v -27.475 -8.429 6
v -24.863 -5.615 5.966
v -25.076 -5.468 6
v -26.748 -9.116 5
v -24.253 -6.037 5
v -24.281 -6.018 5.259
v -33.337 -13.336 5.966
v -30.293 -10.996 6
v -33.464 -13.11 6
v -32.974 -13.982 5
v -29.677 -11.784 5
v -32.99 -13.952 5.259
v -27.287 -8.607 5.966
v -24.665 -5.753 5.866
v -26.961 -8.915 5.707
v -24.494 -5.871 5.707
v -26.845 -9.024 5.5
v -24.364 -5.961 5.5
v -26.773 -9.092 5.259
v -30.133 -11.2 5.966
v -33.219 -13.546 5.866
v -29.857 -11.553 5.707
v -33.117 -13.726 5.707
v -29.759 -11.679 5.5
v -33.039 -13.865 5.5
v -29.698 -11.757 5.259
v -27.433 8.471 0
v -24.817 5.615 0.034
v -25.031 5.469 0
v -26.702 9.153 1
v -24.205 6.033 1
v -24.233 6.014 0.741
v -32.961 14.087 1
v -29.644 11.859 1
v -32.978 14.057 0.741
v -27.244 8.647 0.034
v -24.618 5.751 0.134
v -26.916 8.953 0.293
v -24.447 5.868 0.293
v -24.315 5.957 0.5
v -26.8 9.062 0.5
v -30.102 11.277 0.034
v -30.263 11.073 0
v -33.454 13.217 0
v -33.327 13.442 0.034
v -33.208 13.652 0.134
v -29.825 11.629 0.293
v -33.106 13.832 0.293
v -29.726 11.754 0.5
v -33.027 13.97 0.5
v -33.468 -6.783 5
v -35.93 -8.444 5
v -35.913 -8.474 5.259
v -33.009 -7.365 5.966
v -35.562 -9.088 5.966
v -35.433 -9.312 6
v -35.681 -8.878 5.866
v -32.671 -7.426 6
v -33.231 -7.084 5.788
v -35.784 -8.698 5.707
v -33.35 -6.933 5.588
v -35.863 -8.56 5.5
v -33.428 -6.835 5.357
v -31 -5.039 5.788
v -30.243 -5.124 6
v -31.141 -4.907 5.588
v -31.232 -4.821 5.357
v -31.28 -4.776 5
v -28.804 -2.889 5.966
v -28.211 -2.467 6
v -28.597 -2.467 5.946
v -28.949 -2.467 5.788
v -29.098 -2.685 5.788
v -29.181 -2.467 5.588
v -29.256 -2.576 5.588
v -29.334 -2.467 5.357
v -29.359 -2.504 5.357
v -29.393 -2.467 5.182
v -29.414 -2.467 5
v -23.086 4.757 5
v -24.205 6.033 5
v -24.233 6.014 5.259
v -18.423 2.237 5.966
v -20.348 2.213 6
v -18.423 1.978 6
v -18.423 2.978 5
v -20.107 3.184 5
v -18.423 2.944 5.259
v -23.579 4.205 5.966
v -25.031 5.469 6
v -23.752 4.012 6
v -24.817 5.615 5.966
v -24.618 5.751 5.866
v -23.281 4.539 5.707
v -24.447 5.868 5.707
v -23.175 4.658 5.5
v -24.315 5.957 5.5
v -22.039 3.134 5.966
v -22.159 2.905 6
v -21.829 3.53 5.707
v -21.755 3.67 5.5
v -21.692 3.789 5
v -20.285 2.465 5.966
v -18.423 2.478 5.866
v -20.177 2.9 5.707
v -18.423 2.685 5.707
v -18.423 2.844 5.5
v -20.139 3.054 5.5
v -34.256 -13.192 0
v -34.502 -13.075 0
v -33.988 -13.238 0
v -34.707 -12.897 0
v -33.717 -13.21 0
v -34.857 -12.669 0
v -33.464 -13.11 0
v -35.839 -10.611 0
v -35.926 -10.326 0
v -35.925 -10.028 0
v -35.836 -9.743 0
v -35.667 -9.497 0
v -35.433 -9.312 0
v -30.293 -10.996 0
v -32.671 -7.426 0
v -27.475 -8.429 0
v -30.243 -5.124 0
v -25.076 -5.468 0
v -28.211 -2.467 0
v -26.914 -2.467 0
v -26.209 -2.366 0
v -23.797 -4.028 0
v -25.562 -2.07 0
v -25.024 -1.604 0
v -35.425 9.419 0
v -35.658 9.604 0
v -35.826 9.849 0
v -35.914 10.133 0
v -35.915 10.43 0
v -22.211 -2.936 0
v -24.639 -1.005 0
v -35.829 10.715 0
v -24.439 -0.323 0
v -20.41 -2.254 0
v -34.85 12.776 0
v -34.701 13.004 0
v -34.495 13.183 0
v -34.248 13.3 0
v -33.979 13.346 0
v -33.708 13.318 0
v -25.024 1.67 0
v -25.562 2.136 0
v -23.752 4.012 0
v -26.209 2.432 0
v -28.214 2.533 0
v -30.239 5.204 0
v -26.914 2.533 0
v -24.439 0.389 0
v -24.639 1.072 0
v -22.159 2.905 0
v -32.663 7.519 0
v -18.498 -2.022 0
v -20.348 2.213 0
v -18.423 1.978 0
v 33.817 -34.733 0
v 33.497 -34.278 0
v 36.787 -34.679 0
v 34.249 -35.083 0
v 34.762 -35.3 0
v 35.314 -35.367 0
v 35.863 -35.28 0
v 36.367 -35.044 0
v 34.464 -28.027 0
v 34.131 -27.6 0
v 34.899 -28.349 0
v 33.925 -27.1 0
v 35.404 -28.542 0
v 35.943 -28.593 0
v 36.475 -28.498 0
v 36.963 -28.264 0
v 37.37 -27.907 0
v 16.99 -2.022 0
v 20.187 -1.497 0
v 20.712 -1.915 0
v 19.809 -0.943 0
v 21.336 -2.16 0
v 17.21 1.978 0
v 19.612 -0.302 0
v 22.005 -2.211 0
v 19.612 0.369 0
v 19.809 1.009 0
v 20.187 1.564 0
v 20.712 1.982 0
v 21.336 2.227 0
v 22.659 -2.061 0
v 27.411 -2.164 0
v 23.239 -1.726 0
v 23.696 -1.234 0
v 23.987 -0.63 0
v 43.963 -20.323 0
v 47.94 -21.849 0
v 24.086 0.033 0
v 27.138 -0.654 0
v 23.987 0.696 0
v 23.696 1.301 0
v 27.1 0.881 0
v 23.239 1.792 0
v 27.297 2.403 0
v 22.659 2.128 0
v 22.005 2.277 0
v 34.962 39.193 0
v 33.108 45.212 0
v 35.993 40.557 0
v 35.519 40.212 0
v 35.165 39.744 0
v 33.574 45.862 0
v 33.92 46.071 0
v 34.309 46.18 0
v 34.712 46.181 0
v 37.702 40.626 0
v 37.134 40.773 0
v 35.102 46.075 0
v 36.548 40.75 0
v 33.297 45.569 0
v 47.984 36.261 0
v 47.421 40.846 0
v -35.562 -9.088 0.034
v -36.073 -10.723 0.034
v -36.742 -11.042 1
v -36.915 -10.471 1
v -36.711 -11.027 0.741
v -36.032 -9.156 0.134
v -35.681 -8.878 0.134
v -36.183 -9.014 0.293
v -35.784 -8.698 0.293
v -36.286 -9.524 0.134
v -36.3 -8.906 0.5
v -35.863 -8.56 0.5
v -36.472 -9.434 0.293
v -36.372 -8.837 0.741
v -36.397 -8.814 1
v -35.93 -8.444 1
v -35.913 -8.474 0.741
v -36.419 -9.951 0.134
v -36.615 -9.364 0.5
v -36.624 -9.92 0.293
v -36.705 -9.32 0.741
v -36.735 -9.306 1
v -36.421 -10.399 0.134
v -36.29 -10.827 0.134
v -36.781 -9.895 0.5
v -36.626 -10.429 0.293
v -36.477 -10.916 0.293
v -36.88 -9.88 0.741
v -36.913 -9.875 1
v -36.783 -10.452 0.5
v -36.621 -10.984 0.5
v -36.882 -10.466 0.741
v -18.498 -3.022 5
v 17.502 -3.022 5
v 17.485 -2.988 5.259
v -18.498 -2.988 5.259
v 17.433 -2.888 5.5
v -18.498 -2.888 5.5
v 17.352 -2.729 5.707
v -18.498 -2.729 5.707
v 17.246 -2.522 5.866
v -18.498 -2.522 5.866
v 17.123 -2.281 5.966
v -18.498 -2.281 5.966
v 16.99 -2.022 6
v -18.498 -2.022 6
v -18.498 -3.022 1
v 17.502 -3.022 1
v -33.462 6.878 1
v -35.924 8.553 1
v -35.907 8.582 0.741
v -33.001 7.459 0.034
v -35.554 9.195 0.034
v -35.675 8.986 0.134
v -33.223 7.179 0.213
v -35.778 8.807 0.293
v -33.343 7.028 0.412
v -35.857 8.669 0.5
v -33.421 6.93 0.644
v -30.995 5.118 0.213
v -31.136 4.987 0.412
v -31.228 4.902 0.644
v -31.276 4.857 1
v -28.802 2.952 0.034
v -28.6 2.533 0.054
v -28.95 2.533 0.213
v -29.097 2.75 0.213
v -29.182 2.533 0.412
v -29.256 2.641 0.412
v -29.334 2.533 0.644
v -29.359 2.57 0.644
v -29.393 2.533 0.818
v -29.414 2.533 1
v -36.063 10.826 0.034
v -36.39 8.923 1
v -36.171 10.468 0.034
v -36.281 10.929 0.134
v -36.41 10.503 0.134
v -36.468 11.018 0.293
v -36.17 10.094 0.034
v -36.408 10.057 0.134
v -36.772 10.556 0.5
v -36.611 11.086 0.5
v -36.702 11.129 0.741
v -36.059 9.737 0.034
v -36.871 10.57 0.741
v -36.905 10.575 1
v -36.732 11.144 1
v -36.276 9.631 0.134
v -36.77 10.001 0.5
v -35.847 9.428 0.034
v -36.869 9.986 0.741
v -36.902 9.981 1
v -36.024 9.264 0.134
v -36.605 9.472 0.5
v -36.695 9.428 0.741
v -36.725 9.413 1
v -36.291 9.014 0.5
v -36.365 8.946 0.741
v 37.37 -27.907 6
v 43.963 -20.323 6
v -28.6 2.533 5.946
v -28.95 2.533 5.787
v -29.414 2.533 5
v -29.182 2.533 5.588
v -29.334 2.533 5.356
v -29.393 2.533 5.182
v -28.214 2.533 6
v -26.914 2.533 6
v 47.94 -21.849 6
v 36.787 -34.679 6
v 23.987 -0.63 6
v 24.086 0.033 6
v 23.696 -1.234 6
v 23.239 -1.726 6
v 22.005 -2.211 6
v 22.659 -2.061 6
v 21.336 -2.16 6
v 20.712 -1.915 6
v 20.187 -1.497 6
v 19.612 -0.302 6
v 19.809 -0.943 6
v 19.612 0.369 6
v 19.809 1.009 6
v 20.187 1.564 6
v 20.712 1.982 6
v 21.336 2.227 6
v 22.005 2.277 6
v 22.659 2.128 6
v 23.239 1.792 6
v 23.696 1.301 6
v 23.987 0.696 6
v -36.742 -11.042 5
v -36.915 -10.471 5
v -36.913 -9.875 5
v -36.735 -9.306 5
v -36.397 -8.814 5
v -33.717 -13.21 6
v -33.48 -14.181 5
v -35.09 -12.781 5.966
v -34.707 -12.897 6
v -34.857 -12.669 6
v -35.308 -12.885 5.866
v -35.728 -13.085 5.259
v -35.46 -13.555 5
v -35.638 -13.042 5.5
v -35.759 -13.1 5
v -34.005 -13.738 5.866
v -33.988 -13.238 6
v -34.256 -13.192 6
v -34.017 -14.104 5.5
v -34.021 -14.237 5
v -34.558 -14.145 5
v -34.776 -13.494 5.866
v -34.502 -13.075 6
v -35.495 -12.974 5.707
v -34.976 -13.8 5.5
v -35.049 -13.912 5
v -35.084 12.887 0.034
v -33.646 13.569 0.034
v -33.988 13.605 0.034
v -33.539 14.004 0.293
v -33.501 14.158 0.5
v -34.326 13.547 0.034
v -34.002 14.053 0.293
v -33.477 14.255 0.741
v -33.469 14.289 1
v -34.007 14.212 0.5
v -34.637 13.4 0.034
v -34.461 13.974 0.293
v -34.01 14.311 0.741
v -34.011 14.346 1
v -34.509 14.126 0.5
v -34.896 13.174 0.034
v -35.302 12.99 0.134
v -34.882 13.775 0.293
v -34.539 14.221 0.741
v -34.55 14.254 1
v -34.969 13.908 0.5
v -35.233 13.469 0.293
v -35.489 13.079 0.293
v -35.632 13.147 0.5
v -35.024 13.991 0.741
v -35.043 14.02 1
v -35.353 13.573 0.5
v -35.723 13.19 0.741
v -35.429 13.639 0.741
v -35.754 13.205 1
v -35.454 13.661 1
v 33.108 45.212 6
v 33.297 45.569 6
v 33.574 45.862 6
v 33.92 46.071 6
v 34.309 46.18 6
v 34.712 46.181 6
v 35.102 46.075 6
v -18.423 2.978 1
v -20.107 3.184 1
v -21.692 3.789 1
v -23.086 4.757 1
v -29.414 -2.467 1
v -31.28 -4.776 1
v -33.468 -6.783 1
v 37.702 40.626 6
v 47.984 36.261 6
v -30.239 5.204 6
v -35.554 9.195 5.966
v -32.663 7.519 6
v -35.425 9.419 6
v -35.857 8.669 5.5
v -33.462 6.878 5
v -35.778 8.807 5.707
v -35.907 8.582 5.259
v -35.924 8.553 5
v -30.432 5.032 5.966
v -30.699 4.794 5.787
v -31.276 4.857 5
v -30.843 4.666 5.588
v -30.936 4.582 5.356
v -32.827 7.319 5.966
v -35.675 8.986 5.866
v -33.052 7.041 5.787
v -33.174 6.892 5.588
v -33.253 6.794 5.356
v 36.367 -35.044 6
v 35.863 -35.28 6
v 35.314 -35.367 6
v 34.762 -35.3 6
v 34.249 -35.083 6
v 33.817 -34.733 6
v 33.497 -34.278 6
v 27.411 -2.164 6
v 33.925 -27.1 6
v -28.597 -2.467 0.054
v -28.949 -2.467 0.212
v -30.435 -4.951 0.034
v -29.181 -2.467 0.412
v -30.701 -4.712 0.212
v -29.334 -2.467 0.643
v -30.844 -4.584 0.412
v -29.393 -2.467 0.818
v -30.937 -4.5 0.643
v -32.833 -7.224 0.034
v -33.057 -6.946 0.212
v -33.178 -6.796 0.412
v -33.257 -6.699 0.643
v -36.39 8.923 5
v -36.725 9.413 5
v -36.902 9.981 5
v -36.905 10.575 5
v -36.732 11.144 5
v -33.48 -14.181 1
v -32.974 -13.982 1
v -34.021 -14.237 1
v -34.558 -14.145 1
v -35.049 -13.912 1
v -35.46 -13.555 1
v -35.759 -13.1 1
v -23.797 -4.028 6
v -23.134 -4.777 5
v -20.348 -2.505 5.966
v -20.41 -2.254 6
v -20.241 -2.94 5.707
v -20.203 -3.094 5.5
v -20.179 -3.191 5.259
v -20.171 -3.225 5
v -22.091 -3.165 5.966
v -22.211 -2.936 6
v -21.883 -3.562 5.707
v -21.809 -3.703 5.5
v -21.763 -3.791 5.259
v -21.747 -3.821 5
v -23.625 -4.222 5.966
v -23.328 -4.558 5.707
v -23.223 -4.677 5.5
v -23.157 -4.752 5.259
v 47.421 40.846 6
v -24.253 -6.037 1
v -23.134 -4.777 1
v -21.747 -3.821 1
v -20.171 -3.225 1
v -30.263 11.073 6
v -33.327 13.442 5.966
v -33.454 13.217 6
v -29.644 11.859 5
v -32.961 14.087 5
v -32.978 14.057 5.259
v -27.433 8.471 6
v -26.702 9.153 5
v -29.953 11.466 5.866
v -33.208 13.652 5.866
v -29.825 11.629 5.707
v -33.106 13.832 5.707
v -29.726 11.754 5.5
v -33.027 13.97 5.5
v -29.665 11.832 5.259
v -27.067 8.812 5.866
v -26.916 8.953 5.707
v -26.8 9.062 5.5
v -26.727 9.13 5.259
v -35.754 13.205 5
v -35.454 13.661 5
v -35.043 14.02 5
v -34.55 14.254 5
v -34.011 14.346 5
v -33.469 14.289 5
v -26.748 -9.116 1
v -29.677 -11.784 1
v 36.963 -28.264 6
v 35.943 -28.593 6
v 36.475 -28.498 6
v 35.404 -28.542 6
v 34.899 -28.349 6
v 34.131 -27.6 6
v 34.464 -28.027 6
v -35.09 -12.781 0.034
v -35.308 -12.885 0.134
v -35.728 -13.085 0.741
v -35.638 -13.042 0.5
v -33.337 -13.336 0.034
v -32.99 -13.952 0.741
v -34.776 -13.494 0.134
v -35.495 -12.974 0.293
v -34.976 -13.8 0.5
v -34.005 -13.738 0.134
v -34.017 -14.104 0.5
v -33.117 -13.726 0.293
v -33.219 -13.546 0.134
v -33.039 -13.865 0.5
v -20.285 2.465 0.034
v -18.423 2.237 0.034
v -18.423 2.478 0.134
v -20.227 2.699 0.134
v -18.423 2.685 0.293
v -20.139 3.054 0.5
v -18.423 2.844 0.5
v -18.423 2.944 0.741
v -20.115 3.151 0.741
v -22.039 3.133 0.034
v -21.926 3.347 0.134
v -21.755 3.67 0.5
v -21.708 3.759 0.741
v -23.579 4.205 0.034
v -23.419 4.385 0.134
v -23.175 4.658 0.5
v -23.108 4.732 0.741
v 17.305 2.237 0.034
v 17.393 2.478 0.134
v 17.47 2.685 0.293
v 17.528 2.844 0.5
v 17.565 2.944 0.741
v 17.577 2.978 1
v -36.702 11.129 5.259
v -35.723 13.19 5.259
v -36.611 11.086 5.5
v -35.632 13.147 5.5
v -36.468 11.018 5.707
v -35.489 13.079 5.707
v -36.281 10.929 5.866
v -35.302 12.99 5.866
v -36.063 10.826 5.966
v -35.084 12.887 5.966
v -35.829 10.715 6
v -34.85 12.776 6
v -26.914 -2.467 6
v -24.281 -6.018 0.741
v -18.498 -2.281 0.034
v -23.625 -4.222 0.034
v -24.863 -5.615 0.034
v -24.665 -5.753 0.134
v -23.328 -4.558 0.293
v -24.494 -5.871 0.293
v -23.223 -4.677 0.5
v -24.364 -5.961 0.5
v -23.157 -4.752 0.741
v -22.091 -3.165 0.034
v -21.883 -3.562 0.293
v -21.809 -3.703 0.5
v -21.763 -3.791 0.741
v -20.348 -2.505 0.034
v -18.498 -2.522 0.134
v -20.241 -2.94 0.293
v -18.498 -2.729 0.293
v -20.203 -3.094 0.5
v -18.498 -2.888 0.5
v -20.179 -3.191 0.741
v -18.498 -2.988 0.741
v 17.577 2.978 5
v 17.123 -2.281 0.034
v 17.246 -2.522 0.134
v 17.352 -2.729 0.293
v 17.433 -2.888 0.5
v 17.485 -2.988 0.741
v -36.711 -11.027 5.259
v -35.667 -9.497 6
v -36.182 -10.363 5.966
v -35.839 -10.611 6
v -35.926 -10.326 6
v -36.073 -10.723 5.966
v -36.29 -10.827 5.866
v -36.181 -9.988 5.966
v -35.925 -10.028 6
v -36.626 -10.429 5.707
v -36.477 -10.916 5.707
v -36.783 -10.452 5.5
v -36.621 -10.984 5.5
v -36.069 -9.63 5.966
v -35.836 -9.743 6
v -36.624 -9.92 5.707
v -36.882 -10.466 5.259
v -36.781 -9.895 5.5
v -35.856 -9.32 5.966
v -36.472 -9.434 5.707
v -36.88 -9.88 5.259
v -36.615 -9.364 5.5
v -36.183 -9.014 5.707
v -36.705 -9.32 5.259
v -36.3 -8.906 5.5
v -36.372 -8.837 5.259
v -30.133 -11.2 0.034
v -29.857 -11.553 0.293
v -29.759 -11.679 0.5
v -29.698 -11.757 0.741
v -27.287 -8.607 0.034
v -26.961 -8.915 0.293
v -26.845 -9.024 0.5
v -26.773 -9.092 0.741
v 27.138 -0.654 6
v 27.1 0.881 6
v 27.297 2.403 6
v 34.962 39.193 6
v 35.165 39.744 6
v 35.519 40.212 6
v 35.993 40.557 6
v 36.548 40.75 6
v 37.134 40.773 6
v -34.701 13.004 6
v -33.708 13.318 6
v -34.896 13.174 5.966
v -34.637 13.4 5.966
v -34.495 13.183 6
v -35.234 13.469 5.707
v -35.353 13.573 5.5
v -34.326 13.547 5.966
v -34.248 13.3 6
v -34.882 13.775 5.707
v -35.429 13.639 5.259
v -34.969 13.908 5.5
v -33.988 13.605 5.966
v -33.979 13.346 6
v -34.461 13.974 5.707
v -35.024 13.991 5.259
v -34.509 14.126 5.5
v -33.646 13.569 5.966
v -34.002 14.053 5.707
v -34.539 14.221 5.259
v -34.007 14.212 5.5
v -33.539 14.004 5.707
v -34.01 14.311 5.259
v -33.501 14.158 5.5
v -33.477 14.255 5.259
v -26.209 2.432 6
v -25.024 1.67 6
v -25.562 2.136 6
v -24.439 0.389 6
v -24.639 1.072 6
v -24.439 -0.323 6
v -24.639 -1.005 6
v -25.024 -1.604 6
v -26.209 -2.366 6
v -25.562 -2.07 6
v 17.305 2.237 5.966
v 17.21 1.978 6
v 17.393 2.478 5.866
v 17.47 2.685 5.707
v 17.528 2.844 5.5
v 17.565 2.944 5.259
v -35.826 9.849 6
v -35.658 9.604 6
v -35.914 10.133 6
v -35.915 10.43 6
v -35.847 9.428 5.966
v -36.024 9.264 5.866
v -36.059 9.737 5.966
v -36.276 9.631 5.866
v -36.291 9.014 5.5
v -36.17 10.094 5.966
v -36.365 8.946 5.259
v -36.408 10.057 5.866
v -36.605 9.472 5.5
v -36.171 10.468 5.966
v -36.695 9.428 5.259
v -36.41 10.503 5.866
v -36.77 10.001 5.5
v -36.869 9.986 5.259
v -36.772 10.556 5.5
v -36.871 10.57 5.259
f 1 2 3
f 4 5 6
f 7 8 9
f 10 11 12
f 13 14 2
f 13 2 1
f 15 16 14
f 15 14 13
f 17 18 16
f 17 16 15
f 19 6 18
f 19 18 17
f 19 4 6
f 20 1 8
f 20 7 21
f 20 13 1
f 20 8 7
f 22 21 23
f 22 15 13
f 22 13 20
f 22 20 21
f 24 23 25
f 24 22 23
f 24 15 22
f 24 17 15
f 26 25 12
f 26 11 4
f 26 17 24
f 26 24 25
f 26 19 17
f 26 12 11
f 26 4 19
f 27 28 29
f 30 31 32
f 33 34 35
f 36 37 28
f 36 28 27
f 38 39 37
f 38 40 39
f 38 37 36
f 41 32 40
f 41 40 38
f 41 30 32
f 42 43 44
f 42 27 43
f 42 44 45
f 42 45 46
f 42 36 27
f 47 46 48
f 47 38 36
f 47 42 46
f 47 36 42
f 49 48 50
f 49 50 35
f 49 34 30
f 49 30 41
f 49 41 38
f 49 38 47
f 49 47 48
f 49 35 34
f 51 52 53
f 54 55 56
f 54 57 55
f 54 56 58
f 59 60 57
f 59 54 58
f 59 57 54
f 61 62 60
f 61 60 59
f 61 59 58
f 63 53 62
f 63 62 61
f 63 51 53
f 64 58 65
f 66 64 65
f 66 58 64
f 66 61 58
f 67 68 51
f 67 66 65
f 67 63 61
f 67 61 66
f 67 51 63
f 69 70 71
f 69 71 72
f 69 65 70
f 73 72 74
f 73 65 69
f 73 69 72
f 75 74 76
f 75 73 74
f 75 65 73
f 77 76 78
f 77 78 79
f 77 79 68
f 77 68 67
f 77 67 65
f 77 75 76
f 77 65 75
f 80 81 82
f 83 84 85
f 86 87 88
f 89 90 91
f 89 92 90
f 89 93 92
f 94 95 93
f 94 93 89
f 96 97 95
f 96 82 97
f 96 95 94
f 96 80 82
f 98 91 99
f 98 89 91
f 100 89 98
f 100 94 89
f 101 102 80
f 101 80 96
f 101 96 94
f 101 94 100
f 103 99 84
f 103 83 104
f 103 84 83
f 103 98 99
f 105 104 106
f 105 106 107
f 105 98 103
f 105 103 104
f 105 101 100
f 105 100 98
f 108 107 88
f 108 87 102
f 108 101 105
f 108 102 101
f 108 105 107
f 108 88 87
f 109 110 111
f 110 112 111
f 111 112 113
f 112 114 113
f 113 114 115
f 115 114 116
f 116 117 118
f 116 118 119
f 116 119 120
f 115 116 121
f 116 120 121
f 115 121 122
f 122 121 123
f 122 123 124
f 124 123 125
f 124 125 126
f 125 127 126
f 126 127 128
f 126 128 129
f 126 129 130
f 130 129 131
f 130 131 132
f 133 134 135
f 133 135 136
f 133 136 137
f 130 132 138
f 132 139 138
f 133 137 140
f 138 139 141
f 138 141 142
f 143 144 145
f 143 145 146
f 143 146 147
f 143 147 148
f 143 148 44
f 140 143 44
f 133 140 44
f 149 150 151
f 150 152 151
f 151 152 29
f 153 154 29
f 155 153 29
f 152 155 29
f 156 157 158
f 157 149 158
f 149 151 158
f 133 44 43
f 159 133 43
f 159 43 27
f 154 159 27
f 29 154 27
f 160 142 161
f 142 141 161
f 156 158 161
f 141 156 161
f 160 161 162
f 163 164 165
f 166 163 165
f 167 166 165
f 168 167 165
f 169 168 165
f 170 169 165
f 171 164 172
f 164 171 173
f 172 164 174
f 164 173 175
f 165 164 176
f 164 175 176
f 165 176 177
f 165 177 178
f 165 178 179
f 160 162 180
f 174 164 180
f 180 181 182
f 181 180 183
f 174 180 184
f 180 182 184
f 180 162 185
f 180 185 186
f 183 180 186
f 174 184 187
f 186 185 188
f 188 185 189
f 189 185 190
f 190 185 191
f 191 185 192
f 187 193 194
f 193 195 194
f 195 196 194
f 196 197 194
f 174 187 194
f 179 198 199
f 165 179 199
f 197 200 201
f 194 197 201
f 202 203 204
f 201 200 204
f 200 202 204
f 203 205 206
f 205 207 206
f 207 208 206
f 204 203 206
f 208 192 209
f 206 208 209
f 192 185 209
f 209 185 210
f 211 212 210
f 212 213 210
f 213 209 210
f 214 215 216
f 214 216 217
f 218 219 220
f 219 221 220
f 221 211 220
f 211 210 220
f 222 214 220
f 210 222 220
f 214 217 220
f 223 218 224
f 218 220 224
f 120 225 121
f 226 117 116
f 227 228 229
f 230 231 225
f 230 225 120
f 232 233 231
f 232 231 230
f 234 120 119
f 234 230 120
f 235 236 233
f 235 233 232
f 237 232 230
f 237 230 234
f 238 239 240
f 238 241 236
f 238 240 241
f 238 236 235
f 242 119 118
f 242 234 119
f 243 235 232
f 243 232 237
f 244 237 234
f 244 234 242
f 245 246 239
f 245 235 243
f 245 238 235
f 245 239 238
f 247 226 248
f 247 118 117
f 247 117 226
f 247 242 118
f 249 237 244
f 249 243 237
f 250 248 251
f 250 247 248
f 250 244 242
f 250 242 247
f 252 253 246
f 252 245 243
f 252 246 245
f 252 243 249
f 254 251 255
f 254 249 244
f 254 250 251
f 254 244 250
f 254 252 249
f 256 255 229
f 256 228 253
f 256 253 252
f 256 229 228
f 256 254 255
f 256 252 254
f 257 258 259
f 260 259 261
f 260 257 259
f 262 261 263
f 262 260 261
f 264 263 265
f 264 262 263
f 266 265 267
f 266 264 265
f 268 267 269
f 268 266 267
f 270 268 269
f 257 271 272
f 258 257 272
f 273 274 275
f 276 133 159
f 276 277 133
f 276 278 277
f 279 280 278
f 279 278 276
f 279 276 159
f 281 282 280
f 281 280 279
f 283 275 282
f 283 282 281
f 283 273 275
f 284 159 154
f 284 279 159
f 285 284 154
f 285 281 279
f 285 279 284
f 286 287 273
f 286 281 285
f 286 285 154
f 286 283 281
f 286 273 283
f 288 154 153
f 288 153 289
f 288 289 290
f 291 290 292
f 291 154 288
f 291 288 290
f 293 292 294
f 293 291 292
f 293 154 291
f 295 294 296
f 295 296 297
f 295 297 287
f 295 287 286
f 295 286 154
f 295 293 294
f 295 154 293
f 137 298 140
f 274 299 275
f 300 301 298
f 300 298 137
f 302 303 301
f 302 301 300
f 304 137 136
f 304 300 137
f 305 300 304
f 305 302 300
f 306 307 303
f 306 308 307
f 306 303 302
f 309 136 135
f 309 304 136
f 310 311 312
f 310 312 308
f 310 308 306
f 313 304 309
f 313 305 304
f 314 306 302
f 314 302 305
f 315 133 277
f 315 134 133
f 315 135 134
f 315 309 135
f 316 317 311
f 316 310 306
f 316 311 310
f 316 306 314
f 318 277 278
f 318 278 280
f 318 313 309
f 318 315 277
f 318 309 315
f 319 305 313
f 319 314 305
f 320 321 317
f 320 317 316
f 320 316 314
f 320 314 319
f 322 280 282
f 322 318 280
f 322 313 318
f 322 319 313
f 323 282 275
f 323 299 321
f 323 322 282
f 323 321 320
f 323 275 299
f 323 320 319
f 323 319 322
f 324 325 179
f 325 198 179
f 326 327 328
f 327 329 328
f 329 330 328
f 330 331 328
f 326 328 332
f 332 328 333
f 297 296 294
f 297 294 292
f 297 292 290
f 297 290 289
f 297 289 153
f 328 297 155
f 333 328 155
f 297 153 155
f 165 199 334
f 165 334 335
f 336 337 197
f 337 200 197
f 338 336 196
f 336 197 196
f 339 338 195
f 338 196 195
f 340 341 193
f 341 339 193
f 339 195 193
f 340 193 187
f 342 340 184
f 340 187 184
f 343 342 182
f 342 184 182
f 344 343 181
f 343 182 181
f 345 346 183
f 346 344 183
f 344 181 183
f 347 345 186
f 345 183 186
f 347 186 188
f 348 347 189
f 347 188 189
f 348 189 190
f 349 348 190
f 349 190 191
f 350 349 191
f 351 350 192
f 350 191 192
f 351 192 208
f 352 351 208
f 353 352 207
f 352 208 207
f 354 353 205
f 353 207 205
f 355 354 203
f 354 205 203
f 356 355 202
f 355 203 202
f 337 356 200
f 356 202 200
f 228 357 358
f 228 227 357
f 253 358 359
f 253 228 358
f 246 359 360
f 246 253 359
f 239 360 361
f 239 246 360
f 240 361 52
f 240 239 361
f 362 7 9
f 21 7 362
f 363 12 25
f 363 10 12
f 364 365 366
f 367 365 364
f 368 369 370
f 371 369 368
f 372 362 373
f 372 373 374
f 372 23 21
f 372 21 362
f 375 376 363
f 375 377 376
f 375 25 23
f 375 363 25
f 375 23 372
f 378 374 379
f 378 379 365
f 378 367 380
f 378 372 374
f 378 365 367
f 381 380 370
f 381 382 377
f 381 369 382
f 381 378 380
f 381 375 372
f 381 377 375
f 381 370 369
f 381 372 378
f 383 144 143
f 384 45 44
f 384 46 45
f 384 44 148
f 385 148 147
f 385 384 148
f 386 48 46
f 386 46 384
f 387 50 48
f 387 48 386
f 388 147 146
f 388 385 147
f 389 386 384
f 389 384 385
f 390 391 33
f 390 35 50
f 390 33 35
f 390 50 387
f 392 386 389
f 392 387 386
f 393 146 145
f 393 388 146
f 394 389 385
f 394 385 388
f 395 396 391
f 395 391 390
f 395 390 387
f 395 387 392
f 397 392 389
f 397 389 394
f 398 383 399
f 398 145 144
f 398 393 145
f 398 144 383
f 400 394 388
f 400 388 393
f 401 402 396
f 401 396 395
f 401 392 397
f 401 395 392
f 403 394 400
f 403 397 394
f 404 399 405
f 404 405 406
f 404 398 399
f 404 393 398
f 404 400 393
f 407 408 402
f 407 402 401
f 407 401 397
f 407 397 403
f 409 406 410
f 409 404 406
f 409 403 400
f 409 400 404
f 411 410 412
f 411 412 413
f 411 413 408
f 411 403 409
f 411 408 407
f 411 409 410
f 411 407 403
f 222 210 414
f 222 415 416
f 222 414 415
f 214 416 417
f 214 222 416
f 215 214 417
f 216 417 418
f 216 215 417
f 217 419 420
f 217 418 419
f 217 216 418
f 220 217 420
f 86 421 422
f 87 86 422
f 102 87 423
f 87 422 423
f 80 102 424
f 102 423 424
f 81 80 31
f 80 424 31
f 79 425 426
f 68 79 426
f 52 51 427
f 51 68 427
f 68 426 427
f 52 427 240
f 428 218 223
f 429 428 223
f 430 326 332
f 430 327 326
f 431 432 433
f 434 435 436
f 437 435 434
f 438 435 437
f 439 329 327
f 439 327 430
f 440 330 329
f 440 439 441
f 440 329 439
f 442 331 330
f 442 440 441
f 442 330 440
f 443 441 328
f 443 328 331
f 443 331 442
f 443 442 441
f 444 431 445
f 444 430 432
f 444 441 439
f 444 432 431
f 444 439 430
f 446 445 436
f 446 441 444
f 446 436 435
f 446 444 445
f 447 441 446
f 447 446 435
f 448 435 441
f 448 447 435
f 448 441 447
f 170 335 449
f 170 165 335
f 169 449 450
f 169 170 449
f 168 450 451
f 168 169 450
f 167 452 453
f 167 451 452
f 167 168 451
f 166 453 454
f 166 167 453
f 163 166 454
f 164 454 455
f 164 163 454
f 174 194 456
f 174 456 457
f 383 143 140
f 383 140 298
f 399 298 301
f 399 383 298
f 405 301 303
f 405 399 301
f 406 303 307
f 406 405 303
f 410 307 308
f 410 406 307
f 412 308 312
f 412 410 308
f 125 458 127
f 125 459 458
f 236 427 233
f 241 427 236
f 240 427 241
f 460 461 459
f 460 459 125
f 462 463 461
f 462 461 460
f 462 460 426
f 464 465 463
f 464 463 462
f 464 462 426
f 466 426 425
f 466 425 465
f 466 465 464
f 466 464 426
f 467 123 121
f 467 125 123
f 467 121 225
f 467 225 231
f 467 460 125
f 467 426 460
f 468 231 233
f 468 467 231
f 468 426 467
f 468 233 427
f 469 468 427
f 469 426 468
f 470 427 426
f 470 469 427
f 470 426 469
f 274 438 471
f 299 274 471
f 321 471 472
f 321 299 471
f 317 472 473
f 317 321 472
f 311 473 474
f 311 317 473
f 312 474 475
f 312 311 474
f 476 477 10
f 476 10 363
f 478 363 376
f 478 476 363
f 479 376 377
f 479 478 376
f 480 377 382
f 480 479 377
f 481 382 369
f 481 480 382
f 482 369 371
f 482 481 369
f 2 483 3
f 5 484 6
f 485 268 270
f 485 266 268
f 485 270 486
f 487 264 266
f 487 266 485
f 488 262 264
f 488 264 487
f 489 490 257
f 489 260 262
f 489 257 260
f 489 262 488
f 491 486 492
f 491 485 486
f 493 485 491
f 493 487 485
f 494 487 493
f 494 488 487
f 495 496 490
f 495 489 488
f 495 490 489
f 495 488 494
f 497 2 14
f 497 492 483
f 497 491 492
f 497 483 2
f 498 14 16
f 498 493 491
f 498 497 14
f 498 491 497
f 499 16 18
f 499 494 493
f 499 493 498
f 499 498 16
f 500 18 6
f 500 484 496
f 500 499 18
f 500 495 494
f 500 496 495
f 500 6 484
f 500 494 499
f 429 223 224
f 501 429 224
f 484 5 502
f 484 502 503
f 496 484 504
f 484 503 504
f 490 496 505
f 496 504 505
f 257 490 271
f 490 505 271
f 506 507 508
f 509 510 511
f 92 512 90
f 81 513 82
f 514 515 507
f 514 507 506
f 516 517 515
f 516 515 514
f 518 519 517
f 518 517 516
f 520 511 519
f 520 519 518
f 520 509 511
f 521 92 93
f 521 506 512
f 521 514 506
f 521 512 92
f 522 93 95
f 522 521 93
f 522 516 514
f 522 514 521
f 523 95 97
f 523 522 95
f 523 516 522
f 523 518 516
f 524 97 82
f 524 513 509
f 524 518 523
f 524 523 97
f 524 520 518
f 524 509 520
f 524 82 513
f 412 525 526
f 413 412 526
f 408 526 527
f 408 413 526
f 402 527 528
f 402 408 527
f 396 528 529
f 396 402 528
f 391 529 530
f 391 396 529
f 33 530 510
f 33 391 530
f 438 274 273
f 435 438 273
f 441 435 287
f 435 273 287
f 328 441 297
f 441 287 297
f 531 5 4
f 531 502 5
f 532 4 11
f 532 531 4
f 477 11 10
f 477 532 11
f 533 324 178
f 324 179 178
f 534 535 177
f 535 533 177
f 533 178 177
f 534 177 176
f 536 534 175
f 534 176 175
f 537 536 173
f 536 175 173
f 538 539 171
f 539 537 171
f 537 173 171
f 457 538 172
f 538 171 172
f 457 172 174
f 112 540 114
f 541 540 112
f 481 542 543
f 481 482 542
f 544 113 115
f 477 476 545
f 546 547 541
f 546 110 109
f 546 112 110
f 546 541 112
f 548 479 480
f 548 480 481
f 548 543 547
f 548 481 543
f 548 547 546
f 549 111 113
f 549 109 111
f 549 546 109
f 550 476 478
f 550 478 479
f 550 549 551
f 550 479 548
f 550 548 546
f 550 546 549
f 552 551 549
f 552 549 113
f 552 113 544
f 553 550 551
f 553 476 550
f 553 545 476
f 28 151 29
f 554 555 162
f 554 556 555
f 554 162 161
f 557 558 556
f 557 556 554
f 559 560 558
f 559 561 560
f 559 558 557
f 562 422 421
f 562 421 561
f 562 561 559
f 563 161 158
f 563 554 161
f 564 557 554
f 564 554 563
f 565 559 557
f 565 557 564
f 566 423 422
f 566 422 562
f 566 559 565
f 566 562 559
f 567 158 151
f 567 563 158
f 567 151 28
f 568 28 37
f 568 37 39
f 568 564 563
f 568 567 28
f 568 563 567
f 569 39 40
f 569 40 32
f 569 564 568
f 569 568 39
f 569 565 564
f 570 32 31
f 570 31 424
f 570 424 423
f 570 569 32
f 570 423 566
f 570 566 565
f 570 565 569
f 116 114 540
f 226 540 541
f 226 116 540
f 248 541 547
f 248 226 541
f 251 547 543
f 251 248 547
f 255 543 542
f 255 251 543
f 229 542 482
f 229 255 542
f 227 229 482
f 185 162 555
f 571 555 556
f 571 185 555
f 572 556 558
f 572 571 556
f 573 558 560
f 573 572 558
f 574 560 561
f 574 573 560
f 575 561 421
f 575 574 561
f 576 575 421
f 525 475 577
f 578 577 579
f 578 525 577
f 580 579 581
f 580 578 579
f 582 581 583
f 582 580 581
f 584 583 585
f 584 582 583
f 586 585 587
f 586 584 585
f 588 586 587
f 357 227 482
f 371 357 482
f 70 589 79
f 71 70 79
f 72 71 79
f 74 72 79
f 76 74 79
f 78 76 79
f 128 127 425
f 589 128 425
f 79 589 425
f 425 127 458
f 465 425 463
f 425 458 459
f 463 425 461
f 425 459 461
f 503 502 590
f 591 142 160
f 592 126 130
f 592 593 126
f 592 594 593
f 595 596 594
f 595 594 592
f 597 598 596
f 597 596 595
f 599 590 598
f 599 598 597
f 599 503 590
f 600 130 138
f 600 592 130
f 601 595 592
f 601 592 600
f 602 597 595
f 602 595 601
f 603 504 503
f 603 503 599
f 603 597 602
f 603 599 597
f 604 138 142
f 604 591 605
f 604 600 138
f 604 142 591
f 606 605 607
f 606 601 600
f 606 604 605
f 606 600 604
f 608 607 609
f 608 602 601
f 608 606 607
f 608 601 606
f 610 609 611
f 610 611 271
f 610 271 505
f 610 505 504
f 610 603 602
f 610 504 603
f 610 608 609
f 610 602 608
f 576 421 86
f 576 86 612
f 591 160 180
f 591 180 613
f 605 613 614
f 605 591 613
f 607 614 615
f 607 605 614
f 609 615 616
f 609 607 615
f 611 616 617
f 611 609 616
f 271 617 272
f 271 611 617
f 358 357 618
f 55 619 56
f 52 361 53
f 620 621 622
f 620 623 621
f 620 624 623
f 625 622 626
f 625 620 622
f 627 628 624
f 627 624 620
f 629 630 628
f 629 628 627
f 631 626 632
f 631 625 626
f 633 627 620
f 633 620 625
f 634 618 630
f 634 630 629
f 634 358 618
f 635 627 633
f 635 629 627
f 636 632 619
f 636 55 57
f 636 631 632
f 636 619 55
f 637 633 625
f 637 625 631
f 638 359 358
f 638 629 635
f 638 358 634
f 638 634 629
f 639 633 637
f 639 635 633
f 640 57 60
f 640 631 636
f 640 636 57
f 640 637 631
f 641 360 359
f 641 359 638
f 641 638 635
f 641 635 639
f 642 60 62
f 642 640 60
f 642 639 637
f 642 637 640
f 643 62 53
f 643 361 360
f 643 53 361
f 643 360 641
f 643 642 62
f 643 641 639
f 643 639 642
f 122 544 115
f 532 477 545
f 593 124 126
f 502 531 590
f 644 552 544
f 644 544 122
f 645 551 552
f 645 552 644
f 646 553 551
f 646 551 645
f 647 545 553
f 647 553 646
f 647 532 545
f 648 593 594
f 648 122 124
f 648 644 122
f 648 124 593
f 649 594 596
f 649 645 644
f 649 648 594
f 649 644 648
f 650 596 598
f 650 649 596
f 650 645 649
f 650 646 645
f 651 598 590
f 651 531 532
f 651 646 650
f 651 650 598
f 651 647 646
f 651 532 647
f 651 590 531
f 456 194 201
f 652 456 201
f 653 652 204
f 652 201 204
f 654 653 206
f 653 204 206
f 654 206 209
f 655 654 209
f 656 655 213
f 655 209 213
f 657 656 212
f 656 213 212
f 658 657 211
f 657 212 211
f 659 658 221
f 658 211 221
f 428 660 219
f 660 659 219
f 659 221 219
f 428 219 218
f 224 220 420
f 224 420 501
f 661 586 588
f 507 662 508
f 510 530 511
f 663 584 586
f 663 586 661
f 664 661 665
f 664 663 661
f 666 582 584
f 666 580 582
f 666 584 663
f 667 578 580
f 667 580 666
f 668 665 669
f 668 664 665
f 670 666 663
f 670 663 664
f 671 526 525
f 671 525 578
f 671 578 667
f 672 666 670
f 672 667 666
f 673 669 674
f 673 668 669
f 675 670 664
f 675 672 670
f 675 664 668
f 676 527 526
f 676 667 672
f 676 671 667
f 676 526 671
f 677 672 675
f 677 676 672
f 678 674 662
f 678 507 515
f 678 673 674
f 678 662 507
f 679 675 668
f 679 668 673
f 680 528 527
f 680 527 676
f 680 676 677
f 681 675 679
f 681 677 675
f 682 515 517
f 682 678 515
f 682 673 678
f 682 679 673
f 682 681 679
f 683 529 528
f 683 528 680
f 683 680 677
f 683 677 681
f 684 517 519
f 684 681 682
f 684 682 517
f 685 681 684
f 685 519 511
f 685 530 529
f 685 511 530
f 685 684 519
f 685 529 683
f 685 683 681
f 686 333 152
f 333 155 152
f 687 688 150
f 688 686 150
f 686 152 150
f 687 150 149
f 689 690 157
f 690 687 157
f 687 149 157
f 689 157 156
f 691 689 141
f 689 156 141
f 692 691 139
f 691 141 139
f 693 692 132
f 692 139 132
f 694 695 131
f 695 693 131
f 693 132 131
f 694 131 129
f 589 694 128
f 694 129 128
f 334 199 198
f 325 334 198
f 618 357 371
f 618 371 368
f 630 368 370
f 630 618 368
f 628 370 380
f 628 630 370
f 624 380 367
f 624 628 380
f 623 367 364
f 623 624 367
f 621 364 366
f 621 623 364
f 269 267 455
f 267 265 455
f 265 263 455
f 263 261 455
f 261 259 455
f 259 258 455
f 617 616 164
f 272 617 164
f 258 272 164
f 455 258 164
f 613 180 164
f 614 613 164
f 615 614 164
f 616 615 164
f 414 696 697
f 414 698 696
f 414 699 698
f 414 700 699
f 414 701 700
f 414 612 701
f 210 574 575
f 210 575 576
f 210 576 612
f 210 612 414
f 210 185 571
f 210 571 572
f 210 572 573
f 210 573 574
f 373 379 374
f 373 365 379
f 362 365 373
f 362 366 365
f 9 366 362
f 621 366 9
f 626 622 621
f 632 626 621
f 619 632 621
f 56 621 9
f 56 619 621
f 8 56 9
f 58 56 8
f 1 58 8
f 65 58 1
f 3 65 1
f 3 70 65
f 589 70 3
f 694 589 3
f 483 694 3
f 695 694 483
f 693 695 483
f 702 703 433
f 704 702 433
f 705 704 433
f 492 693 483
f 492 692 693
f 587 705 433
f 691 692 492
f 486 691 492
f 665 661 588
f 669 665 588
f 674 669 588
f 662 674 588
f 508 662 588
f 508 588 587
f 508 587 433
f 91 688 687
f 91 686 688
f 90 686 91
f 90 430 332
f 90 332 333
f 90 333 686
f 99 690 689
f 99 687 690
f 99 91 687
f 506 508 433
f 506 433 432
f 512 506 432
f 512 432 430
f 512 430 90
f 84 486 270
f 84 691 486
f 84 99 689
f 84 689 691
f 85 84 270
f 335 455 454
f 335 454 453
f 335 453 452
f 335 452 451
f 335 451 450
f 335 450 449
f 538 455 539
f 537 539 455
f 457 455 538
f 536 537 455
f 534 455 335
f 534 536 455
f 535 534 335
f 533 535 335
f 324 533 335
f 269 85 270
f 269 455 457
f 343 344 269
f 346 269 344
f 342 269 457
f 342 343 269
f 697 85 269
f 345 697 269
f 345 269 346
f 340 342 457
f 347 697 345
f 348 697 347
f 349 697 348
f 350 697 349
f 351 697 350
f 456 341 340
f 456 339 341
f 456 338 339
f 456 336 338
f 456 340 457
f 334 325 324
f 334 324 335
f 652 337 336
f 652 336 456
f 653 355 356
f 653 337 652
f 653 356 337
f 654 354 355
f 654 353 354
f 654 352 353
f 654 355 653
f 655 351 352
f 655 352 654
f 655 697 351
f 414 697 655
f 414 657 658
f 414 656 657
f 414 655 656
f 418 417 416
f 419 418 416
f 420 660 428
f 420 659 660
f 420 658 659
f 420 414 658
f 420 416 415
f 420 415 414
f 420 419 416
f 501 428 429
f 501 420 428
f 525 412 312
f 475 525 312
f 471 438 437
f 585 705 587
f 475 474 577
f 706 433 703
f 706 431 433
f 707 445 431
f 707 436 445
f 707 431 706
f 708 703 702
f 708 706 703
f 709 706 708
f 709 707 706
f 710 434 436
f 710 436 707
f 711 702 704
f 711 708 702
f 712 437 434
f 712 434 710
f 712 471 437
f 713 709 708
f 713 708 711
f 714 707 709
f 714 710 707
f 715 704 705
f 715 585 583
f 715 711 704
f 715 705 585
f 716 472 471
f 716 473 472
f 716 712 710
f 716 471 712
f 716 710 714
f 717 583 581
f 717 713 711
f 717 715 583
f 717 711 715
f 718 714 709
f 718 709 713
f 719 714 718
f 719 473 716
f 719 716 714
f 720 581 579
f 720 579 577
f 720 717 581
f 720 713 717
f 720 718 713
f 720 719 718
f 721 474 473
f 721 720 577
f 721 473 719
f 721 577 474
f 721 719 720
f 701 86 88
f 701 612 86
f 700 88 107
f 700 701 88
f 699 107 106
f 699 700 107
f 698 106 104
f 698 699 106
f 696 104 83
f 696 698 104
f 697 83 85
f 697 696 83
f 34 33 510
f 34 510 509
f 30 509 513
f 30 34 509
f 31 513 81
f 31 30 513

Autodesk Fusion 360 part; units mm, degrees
sketch "main" plane through (0, 0, 0) normal (0, 0, 1) x (1, 0, 0)
  circle A0 centre (21.8365, 0.0332) radius 2.25
  line L0 (-29.4135, 2.5332) -> (-26.9135, 2.5332)
  line L1 (-26.9135, -2.4668) -> (-29.4135, -2.4668)
  line L2 (-34.9258, 10.2857) -> (-33.9469, 12.3465) construction
  line L3 (-35.7535, 13.2046) -> (-36.7324, 11.1438)
  arc A1 (-32.9614, 14.0869) -> (-35.7535, 13.2046) centre (-33.9469, 12.3465) ccw
  arc A2 (-36.7324, 11.1438) -> (-35.9243, 8.5528) centre (-34.9258, 10.2857) ccw
  arc A3 (-24.2048, 6.0328) -> (-32.9614, 14.0869) centre (-45.9085, -8.7768) ccw
  line L4 (-36.7417, -11.0419) -> (-35.7592, -13.1001)
  arc A4 (-35.9295, -8.4441) -> (-36.7417, -11.0419) centre (-34.9367, -10.1804) ccw
  arc A5 (-35.7592, -13.1001) -> (-32.8186, -13.8848) centre (-33.9543, -12.2386) ccw
  line L5 (-32.8186, -13.8848) -> (-32.8147, -13.8915) construction
  arc A6 (-35.9295, -8.4441) -> (-29.4135, -2.4668) centre (-45.8569, 8.9181) ccw
  arc A7 (-26.9362, -2.4667) -> (-26.9135, 2.5332) centre (-26.9135, 0.0332) ccw
  arc A8 (-29.4135, 2.5332) -> (-35.9243, 8.5528) centre (-45.9085, -8.7768) ccw
  arc A9 (-26.9361, -2.4668) -> (-26.9362, -2.4667) centre (-45.9085, -8.7768) ccw
  arc A10 (-32.9737, -13.9817) -> (-24.2534, -6.0374) centre (-45.8569, 8.9181) ccw
  circle A11 centre (-18.4227, 9.9783) radius 7
  circle A12 centre (-18.498, -10.0217) radius 7
  line L6 (-18.4227, 2.9783) -> (17.5773, 2.9783)
  line L7 (-18.498, -3.0217) -> (17.502, -3.0217)
  line L8 (17.5773, 2.9783) -> (33.1079, 45.2119)
  line L9 (17.502, -3.0217) -> (33.4968, -34.2782)
  line L10 (47.9397, -21.8492) -> (36.7867, -34.6793)
  arc A13 (33.4968, -34.2782) -> (36.7867, -34.6793) centre (35.2773, -33.3672) ccw
  line L11 (47.9397, -21.8492) -> (43.9626, -20.3226)
  line L12 (43.9626, -20.3226) -> (37.3696, -27.907)
  line L13 (27.4111, -2.1643) -> (33.9251, -27.1004)
  arc A14 (33.9251, -27.1004) -> (37.3696, -27.907) centre (35.8602, -26.5949) ccw
  line L14 (27.2967, 2.403) -> (34.9624, 39.1928)
  arc A15 (27.2967, 2.403) -> (27.4111, -2.1643) centre (37.0865, 0.3632) ccw
  line L15 (37.7018, 40.6259) -> (47.9839, 36.2614)
  arc A16 (37.7018, 40.6259) -> (34.9624, 39.1928) centre (36.9204, 38.7849) ccw
  line L16 (47.9839, 36.2614) -> (47.421, 40.8458)
  line L17 (35.1018, 46.075) -> (47.421, 40.8458)
  arc A17 (35.1018, 46.075) -> (33.1079, 45.2119) centre (34.5157, 44.6942) ccw
  dimension "d1" = 5
  dimension "d3" = 4.5
  dimension "d4" = 2.5
  dimension "d5" = 40
  dimension "d6" = 40
  dimension "d7" = 4
  dimension "d9" = 4
  dimension "d11" = 52.55
  dimension "d12" = 52.55
  dimension "d13" = 4
  dimension "d14" = 4
  dimension "d15" = 14
  dimension "d16" = 14
  dimension "d17" = 20
  dimension "d20" = 110.19
  dimension "d22" = 117.1
  dimension "d25" = 68.1
  dimension "d26" = 2
  dimension "d27" = 17
  dimension "d28" = 4.26
  dimension "d29" = 70
  dimension "d30" = 110
  dimension "d31" = 55.64
  dimension "d32" = 2
  dimension "d33" = 153.59
  dimension "d34" = 10
  dimension "d35" = 78.77
  dimension "d36" = 2
  dimension "d37" = 11.17
  dimension "d38" = 60
  dimension "d39" = 120
  dimension "d40" = 4
  dimension "d41" = 1.5
  dimension "d45" = 48.75
  dimension "d47" = 15.25
  dimension "d48" = 36
  dimension "d49" = 6
extrude "Extrude1" add sketch "main" along normal blind 6 contours L0 L1 L3 A1 A2 A3 A7 A8 A9 A10 A11 A12 L6 L7 L8 L9 L10 A13 L11 L12 L13 A14 L14 A15 L15 A16 L16 L17 A17 | L1 L4 A4 A5 A6 A9 A10 picked at (-28.4657, -7.1435)
fillet "Fillet1" radius 1 28 edges at (-0.4227, 2.9783, 6) (-21.6924, 3.7889, 6) (-28.1213, 10.562, 6) (-34.5495, 14.2536, 6) (-36.2429, 12.1742, 6) (-36.8351, 9.6902, 6) (-32.3311, 5.9083, 6) (-32.337, -5.8201, 6) (-36.8456, -9.5835, 6) (-36.2504, -12.071, 6) (-34.5578, -14.1454, 6) (-28.1619, -10.5052, 6) (-21.7468, -3.8213, 6) (-0.498, -3.0217, 6) (-32.337, -5.8201, 0) (-36.8456, -9.5835, 0) (-36.2504, -12.071, 0) (-34.5578, -14.1454, 0) (-28.1619, -10.5052, 0) (-21.7468, -3.8213, 0) (-0.498, -3.0217, 0) (-0.4227, 2.9783, 0) (-21.6924, 3.7889, 0) (-28.1213, 10.562, 0) (-34.5495, 14.2536, 0) (-36.2429, 12.1742, 0) (-36.8351, 9.6902, 0) (-32.3311, 5.9083, 0)
equation "d47 = 13 mm + 2.25 mm"
